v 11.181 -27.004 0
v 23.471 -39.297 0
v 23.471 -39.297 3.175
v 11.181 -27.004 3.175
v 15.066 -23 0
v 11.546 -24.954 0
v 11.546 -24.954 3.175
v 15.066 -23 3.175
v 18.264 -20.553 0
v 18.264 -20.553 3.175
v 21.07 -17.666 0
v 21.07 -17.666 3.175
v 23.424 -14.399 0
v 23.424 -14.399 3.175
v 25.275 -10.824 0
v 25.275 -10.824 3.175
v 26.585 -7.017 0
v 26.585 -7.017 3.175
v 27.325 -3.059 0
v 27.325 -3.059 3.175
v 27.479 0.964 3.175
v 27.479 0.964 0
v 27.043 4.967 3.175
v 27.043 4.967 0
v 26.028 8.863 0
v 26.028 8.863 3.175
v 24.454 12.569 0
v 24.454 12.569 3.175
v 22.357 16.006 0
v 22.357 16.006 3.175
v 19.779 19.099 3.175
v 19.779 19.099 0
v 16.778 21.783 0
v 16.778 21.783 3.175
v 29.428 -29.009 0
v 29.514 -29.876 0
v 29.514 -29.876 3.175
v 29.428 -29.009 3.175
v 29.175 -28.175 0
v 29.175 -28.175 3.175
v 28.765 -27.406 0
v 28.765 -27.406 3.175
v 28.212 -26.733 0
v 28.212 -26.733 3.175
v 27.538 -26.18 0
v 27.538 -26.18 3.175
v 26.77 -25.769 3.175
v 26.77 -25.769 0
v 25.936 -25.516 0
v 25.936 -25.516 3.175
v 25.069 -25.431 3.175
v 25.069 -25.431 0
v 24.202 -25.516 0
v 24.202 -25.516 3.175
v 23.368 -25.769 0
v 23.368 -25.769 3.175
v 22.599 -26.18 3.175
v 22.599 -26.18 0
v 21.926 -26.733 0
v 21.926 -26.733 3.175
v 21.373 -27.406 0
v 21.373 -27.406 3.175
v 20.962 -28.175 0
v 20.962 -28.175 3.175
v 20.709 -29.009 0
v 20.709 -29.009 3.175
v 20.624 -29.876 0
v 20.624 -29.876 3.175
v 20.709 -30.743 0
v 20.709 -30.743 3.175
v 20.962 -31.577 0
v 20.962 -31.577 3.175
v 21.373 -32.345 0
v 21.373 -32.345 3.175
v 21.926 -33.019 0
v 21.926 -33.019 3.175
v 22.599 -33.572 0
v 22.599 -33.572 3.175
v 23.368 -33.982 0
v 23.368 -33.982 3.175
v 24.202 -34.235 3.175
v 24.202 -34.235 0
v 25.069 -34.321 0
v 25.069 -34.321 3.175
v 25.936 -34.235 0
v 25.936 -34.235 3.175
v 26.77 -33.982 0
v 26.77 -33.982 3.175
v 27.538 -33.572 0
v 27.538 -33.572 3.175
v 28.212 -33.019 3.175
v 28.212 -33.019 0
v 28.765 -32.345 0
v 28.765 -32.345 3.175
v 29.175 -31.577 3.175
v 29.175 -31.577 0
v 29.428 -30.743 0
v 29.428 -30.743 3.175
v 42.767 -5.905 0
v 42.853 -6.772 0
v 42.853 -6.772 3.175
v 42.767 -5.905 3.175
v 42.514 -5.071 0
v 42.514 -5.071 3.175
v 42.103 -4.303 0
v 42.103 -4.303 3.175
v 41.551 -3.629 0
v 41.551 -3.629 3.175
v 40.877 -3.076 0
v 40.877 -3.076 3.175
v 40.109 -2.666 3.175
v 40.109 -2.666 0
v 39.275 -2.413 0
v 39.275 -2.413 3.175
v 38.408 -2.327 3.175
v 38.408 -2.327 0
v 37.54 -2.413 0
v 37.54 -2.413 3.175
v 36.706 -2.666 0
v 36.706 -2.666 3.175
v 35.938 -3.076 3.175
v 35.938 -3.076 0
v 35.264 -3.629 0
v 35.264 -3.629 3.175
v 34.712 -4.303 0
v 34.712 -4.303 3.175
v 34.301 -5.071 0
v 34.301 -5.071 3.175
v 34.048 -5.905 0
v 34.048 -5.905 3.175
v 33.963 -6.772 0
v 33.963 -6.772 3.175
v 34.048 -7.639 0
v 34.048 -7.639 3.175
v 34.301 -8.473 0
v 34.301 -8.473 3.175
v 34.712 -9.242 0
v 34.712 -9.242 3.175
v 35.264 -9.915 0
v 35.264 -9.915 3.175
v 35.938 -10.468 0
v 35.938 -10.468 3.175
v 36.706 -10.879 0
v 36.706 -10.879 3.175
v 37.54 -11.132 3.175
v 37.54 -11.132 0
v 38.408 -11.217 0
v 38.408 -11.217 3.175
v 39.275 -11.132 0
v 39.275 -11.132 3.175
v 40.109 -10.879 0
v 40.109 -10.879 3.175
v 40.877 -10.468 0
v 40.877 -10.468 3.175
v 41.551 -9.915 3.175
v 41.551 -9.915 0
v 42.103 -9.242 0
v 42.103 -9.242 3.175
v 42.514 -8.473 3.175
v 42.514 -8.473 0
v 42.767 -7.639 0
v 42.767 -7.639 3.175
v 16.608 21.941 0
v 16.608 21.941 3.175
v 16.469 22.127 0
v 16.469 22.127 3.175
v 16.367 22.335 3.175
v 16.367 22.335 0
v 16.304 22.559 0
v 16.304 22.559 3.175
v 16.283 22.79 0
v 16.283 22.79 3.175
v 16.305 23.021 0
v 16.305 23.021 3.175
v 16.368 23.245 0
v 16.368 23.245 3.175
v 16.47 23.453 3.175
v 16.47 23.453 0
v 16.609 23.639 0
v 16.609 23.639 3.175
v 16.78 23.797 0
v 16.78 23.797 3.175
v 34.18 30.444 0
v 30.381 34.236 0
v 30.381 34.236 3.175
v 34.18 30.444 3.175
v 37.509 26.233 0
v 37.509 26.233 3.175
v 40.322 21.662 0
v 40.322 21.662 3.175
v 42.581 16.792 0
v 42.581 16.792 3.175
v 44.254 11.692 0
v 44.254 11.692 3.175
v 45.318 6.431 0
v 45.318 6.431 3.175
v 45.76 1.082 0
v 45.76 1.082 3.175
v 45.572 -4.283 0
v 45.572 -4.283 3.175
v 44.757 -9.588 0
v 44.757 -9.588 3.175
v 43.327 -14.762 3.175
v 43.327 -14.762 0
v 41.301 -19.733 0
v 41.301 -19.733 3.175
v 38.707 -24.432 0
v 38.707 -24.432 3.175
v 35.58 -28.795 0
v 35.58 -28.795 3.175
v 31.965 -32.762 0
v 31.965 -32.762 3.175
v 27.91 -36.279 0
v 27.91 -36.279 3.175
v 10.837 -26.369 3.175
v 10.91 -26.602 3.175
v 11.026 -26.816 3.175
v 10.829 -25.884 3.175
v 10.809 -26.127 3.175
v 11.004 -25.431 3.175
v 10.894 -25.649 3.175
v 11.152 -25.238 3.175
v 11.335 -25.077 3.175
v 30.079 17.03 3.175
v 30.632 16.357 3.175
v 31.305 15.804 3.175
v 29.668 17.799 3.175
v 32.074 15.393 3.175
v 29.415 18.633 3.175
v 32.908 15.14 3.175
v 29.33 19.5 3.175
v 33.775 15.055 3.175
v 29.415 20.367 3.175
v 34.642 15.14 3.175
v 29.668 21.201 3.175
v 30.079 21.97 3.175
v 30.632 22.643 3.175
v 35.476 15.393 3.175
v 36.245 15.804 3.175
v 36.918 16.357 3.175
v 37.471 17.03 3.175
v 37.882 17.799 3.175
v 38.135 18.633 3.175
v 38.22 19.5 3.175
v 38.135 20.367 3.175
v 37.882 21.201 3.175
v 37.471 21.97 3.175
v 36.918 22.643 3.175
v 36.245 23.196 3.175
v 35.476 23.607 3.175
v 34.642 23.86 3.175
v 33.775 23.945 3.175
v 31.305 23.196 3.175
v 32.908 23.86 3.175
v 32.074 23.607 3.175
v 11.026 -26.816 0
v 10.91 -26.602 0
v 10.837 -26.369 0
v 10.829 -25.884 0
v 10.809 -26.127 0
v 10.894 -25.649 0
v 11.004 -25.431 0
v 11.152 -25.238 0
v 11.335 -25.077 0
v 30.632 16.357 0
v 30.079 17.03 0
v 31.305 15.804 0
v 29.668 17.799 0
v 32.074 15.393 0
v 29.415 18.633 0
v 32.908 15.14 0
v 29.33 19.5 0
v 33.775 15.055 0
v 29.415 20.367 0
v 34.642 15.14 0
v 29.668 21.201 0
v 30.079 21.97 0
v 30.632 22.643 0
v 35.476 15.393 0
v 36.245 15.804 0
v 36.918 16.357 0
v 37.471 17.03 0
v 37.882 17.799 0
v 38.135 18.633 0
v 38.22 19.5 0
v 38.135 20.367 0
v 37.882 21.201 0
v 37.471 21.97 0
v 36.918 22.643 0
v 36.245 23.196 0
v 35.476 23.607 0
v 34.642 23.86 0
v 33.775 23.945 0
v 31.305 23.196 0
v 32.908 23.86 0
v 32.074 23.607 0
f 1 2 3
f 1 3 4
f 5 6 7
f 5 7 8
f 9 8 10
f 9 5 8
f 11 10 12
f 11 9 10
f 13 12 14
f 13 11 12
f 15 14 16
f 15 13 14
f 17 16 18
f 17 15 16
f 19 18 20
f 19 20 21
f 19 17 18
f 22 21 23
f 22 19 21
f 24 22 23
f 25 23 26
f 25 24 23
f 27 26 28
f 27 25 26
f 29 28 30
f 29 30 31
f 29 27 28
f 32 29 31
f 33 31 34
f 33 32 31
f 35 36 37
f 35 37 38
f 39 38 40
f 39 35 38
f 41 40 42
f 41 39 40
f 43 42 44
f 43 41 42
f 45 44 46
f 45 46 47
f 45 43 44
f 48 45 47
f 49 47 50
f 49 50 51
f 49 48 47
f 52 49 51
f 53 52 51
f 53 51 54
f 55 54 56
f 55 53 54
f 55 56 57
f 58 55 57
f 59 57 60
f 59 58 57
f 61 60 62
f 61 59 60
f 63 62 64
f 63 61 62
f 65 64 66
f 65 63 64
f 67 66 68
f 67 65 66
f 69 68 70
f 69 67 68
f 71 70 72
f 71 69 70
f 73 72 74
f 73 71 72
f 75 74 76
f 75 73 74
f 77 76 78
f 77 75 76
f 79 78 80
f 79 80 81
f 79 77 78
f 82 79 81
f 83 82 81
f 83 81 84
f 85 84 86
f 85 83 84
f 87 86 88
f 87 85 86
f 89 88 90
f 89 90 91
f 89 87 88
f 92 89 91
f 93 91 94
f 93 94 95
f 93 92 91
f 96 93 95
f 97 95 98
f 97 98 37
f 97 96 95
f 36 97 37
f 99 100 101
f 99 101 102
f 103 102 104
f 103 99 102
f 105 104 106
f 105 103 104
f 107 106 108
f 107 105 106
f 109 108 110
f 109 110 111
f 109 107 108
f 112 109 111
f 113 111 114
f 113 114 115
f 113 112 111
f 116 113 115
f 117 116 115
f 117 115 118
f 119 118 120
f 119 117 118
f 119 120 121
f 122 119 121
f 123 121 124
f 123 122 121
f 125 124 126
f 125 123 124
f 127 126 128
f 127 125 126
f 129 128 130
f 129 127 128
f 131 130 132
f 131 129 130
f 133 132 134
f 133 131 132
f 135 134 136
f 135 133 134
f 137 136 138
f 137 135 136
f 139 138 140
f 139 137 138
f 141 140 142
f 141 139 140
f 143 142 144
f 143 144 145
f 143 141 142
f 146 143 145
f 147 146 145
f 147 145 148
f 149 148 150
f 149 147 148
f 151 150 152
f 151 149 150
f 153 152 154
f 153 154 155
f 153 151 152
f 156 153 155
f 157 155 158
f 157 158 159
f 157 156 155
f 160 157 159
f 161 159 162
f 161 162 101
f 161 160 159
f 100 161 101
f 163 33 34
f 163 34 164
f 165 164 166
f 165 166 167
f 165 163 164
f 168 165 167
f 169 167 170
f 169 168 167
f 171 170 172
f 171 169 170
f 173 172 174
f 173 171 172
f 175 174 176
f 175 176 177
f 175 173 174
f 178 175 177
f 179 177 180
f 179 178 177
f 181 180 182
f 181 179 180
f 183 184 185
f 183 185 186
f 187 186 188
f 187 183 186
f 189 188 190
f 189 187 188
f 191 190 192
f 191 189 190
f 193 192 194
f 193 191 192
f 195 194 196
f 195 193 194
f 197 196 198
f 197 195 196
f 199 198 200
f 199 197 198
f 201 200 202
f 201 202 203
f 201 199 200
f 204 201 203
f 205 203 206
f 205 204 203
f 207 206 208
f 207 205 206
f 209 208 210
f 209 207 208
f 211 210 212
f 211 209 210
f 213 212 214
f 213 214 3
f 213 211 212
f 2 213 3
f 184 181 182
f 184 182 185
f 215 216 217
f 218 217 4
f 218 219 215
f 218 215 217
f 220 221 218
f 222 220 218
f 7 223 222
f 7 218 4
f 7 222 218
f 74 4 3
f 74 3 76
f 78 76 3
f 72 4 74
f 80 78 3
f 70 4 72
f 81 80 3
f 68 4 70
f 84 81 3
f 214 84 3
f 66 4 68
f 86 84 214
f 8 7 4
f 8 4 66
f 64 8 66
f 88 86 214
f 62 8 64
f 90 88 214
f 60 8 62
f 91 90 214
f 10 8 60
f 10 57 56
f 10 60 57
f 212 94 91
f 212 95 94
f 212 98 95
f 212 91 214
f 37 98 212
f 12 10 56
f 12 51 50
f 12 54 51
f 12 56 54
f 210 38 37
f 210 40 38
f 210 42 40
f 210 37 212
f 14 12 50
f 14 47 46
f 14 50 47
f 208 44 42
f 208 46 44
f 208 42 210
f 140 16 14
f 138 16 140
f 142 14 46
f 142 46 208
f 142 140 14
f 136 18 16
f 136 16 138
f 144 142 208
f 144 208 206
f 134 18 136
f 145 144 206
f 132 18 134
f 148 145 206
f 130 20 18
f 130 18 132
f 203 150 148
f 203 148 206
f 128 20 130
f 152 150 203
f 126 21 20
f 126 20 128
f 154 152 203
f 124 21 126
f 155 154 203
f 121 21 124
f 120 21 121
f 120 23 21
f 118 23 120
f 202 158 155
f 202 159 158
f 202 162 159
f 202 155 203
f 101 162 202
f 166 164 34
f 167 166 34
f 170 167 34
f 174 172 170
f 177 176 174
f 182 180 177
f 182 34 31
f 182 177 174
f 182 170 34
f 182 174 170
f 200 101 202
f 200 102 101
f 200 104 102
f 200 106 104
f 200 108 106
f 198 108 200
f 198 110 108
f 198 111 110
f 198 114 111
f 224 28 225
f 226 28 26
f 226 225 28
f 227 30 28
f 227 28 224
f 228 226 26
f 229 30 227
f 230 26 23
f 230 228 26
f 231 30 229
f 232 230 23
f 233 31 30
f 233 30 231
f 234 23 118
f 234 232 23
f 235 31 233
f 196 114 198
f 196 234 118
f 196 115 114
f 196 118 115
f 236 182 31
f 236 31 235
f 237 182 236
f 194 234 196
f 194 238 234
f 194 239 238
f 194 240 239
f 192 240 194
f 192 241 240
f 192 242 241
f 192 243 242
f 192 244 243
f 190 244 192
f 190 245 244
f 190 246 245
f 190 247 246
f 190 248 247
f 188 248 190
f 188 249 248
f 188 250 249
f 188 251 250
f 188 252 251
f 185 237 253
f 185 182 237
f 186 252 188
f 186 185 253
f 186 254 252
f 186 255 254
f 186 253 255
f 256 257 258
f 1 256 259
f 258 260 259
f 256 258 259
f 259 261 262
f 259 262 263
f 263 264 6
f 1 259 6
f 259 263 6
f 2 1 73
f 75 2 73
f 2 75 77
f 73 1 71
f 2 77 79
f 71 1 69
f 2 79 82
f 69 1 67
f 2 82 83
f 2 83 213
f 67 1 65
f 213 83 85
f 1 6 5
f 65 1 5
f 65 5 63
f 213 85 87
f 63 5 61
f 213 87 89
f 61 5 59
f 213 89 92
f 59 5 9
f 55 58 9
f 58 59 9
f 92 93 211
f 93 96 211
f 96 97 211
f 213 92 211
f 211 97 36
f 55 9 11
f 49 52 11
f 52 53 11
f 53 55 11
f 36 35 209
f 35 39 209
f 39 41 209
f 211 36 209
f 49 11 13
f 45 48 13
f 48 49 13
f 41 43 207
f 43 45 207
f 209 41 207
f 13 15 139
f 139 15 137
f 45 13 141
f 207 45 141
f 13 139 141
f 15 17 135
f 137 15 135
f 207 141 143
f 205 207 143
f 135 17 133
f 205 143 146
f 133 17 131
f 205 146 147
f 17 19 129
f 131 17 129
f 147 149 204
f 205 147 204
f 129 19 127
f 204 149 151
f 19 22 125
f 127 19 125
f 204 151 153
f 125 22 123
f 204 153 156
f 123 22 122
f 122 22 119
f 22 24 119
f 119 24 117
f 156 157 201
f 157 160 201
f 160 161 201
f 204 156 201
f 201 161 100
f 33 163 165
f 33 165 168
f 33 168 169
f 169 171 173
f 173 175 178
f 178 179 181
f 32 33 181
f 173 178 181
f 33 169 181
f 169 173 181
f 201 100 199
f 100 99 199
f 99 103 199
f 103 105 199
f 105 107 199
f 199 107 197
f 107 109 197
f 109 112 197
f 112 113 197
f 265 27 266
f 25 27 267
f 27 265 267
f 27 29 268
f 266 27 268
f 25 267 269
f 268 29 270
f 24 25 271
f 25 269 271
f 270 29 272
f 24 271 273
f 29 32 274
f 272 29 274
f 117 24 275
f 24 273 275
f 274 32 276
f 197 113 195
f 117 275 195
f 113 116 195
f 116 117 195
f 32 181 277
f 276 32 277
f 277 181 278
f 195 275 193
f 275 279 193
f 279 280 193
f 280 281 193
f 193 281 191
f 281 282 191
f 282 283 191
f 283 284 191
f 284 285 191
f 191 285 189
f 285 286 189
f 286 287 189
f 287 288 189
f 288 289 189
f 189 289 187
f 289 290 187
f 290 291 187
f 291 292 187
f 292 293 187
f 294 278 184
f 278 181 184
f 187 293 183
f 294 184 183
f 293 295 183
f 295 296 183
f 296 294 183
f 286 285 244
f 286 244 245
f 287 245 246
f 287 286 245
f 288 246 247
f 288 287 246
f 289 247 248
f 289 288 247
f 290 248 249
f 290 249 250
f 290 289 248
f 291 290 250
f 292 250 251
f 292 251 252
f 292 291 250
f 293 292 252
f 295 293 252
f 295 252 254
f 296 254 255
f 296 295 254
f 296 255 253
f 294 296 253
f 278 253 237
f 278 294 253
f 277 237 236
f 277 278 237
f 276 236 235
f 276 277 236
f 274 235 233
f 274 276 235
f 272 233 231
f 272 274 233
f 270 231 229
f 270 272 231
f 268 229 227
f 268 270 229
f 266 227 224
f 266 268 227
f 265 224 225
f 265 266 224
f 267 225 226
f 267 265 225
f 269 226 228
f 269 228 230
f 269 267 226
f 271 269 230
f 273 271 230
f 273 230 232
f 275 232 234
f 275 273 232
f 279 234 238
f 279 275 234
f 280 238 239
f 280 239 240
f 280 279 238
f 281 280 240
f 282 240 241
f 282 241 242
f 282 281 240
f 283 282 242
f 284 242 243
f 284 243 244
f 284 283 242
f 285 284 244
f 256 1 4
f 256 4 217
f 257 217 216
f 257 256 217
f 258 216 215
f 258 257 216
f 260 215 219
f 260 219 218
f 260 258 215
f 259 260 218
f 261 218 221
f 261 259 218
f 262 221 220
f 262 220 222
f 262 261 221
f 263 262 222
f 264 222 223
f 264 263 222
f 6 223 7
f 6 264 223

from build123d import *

# Parameters (mm, degrees)
SKETCH6_R           = 6.5
SKETCH6_R_2         = 4.445
BOSS_EXTRUDE3_DEPTH = 3.175


with BuildPart() as part:
    # Sketch6 → Boss-Extrude3 (new body)
    # profile 1 of 4: a face of its own
    with BuildSketch(Plane.XY):
        with BuildLine():
            Line((16.779877408, 23.796523986), (30.381235635, 34.235995151))
            ThreePointArc((30.381235635, 34.235995151), (45.571708019, -4.282787757), (23.47067629, -39.296948955))
            Line((23.47067629, -39.296948955), (11.181031284, -27.004389661))
            ThreePointArc((11.181031284, -27.004389661), (10.828800328, -25.884001858), (11.545866958, -24.953866964))
            ThreePointArc((11.545866958, -24.953866964), (27.324797823, -3.059075709), (16.778161303, 21.782925045))
            ThreePointArc((16.778161303, 21.782925045), (16.283134573, 22.790147137), (16.779877408, 23.796523986))
        make_face()
        with Locations((33.774990729, 19.499999989)):
            Circle(SKETCH6_R, mode=Mode.SUBTRACT)
        with Locations((25.068716764, -29.875733265)):
            Circle(SKETCH6_R, mode=Mode.SUBTRACT)
        with Locations((38.407502346, -6.772278925)):
            Circle(SKETCH6_R, mode=Mode.SUBTRACT)
    # profile 2 of 4: a face of its own
    with BuildSketch(Plane.XY):
        with Locations((25.068716764, -29.875733265)):
            Circle(SKETCH6_R)
        with Locations((25.068716764, -29.875733265)):
            Circle(SKETCH6_R_2, mode=Mode.SUBTRACT)
    # profile 3 of 4: a face of its own
    with BuildSketch(Plane.XY):
        with Locations((38.407502346, -6.772278925)):
            Circle(SKETCH6_R)
        with Locations((38.407502346, -6.772278925)):
            Circle(SKETCH6_R_2, mode=Mode.SUBTRACT)
    # profile 4 of 4: a face of its own
    with BuildSketch(Plane.XY):
        with Locations((33.774990729, 19.499999989)):
            Circle(SKETCH6_R)
        with Locations((33.774990729, 19.499999989)):
            Circle(SKETCH6_R_2, mode=Mode.SUBTRACT)
    extrude(amount=BOSS_EXTRUDE3_DEPTH)


solid = part.part
